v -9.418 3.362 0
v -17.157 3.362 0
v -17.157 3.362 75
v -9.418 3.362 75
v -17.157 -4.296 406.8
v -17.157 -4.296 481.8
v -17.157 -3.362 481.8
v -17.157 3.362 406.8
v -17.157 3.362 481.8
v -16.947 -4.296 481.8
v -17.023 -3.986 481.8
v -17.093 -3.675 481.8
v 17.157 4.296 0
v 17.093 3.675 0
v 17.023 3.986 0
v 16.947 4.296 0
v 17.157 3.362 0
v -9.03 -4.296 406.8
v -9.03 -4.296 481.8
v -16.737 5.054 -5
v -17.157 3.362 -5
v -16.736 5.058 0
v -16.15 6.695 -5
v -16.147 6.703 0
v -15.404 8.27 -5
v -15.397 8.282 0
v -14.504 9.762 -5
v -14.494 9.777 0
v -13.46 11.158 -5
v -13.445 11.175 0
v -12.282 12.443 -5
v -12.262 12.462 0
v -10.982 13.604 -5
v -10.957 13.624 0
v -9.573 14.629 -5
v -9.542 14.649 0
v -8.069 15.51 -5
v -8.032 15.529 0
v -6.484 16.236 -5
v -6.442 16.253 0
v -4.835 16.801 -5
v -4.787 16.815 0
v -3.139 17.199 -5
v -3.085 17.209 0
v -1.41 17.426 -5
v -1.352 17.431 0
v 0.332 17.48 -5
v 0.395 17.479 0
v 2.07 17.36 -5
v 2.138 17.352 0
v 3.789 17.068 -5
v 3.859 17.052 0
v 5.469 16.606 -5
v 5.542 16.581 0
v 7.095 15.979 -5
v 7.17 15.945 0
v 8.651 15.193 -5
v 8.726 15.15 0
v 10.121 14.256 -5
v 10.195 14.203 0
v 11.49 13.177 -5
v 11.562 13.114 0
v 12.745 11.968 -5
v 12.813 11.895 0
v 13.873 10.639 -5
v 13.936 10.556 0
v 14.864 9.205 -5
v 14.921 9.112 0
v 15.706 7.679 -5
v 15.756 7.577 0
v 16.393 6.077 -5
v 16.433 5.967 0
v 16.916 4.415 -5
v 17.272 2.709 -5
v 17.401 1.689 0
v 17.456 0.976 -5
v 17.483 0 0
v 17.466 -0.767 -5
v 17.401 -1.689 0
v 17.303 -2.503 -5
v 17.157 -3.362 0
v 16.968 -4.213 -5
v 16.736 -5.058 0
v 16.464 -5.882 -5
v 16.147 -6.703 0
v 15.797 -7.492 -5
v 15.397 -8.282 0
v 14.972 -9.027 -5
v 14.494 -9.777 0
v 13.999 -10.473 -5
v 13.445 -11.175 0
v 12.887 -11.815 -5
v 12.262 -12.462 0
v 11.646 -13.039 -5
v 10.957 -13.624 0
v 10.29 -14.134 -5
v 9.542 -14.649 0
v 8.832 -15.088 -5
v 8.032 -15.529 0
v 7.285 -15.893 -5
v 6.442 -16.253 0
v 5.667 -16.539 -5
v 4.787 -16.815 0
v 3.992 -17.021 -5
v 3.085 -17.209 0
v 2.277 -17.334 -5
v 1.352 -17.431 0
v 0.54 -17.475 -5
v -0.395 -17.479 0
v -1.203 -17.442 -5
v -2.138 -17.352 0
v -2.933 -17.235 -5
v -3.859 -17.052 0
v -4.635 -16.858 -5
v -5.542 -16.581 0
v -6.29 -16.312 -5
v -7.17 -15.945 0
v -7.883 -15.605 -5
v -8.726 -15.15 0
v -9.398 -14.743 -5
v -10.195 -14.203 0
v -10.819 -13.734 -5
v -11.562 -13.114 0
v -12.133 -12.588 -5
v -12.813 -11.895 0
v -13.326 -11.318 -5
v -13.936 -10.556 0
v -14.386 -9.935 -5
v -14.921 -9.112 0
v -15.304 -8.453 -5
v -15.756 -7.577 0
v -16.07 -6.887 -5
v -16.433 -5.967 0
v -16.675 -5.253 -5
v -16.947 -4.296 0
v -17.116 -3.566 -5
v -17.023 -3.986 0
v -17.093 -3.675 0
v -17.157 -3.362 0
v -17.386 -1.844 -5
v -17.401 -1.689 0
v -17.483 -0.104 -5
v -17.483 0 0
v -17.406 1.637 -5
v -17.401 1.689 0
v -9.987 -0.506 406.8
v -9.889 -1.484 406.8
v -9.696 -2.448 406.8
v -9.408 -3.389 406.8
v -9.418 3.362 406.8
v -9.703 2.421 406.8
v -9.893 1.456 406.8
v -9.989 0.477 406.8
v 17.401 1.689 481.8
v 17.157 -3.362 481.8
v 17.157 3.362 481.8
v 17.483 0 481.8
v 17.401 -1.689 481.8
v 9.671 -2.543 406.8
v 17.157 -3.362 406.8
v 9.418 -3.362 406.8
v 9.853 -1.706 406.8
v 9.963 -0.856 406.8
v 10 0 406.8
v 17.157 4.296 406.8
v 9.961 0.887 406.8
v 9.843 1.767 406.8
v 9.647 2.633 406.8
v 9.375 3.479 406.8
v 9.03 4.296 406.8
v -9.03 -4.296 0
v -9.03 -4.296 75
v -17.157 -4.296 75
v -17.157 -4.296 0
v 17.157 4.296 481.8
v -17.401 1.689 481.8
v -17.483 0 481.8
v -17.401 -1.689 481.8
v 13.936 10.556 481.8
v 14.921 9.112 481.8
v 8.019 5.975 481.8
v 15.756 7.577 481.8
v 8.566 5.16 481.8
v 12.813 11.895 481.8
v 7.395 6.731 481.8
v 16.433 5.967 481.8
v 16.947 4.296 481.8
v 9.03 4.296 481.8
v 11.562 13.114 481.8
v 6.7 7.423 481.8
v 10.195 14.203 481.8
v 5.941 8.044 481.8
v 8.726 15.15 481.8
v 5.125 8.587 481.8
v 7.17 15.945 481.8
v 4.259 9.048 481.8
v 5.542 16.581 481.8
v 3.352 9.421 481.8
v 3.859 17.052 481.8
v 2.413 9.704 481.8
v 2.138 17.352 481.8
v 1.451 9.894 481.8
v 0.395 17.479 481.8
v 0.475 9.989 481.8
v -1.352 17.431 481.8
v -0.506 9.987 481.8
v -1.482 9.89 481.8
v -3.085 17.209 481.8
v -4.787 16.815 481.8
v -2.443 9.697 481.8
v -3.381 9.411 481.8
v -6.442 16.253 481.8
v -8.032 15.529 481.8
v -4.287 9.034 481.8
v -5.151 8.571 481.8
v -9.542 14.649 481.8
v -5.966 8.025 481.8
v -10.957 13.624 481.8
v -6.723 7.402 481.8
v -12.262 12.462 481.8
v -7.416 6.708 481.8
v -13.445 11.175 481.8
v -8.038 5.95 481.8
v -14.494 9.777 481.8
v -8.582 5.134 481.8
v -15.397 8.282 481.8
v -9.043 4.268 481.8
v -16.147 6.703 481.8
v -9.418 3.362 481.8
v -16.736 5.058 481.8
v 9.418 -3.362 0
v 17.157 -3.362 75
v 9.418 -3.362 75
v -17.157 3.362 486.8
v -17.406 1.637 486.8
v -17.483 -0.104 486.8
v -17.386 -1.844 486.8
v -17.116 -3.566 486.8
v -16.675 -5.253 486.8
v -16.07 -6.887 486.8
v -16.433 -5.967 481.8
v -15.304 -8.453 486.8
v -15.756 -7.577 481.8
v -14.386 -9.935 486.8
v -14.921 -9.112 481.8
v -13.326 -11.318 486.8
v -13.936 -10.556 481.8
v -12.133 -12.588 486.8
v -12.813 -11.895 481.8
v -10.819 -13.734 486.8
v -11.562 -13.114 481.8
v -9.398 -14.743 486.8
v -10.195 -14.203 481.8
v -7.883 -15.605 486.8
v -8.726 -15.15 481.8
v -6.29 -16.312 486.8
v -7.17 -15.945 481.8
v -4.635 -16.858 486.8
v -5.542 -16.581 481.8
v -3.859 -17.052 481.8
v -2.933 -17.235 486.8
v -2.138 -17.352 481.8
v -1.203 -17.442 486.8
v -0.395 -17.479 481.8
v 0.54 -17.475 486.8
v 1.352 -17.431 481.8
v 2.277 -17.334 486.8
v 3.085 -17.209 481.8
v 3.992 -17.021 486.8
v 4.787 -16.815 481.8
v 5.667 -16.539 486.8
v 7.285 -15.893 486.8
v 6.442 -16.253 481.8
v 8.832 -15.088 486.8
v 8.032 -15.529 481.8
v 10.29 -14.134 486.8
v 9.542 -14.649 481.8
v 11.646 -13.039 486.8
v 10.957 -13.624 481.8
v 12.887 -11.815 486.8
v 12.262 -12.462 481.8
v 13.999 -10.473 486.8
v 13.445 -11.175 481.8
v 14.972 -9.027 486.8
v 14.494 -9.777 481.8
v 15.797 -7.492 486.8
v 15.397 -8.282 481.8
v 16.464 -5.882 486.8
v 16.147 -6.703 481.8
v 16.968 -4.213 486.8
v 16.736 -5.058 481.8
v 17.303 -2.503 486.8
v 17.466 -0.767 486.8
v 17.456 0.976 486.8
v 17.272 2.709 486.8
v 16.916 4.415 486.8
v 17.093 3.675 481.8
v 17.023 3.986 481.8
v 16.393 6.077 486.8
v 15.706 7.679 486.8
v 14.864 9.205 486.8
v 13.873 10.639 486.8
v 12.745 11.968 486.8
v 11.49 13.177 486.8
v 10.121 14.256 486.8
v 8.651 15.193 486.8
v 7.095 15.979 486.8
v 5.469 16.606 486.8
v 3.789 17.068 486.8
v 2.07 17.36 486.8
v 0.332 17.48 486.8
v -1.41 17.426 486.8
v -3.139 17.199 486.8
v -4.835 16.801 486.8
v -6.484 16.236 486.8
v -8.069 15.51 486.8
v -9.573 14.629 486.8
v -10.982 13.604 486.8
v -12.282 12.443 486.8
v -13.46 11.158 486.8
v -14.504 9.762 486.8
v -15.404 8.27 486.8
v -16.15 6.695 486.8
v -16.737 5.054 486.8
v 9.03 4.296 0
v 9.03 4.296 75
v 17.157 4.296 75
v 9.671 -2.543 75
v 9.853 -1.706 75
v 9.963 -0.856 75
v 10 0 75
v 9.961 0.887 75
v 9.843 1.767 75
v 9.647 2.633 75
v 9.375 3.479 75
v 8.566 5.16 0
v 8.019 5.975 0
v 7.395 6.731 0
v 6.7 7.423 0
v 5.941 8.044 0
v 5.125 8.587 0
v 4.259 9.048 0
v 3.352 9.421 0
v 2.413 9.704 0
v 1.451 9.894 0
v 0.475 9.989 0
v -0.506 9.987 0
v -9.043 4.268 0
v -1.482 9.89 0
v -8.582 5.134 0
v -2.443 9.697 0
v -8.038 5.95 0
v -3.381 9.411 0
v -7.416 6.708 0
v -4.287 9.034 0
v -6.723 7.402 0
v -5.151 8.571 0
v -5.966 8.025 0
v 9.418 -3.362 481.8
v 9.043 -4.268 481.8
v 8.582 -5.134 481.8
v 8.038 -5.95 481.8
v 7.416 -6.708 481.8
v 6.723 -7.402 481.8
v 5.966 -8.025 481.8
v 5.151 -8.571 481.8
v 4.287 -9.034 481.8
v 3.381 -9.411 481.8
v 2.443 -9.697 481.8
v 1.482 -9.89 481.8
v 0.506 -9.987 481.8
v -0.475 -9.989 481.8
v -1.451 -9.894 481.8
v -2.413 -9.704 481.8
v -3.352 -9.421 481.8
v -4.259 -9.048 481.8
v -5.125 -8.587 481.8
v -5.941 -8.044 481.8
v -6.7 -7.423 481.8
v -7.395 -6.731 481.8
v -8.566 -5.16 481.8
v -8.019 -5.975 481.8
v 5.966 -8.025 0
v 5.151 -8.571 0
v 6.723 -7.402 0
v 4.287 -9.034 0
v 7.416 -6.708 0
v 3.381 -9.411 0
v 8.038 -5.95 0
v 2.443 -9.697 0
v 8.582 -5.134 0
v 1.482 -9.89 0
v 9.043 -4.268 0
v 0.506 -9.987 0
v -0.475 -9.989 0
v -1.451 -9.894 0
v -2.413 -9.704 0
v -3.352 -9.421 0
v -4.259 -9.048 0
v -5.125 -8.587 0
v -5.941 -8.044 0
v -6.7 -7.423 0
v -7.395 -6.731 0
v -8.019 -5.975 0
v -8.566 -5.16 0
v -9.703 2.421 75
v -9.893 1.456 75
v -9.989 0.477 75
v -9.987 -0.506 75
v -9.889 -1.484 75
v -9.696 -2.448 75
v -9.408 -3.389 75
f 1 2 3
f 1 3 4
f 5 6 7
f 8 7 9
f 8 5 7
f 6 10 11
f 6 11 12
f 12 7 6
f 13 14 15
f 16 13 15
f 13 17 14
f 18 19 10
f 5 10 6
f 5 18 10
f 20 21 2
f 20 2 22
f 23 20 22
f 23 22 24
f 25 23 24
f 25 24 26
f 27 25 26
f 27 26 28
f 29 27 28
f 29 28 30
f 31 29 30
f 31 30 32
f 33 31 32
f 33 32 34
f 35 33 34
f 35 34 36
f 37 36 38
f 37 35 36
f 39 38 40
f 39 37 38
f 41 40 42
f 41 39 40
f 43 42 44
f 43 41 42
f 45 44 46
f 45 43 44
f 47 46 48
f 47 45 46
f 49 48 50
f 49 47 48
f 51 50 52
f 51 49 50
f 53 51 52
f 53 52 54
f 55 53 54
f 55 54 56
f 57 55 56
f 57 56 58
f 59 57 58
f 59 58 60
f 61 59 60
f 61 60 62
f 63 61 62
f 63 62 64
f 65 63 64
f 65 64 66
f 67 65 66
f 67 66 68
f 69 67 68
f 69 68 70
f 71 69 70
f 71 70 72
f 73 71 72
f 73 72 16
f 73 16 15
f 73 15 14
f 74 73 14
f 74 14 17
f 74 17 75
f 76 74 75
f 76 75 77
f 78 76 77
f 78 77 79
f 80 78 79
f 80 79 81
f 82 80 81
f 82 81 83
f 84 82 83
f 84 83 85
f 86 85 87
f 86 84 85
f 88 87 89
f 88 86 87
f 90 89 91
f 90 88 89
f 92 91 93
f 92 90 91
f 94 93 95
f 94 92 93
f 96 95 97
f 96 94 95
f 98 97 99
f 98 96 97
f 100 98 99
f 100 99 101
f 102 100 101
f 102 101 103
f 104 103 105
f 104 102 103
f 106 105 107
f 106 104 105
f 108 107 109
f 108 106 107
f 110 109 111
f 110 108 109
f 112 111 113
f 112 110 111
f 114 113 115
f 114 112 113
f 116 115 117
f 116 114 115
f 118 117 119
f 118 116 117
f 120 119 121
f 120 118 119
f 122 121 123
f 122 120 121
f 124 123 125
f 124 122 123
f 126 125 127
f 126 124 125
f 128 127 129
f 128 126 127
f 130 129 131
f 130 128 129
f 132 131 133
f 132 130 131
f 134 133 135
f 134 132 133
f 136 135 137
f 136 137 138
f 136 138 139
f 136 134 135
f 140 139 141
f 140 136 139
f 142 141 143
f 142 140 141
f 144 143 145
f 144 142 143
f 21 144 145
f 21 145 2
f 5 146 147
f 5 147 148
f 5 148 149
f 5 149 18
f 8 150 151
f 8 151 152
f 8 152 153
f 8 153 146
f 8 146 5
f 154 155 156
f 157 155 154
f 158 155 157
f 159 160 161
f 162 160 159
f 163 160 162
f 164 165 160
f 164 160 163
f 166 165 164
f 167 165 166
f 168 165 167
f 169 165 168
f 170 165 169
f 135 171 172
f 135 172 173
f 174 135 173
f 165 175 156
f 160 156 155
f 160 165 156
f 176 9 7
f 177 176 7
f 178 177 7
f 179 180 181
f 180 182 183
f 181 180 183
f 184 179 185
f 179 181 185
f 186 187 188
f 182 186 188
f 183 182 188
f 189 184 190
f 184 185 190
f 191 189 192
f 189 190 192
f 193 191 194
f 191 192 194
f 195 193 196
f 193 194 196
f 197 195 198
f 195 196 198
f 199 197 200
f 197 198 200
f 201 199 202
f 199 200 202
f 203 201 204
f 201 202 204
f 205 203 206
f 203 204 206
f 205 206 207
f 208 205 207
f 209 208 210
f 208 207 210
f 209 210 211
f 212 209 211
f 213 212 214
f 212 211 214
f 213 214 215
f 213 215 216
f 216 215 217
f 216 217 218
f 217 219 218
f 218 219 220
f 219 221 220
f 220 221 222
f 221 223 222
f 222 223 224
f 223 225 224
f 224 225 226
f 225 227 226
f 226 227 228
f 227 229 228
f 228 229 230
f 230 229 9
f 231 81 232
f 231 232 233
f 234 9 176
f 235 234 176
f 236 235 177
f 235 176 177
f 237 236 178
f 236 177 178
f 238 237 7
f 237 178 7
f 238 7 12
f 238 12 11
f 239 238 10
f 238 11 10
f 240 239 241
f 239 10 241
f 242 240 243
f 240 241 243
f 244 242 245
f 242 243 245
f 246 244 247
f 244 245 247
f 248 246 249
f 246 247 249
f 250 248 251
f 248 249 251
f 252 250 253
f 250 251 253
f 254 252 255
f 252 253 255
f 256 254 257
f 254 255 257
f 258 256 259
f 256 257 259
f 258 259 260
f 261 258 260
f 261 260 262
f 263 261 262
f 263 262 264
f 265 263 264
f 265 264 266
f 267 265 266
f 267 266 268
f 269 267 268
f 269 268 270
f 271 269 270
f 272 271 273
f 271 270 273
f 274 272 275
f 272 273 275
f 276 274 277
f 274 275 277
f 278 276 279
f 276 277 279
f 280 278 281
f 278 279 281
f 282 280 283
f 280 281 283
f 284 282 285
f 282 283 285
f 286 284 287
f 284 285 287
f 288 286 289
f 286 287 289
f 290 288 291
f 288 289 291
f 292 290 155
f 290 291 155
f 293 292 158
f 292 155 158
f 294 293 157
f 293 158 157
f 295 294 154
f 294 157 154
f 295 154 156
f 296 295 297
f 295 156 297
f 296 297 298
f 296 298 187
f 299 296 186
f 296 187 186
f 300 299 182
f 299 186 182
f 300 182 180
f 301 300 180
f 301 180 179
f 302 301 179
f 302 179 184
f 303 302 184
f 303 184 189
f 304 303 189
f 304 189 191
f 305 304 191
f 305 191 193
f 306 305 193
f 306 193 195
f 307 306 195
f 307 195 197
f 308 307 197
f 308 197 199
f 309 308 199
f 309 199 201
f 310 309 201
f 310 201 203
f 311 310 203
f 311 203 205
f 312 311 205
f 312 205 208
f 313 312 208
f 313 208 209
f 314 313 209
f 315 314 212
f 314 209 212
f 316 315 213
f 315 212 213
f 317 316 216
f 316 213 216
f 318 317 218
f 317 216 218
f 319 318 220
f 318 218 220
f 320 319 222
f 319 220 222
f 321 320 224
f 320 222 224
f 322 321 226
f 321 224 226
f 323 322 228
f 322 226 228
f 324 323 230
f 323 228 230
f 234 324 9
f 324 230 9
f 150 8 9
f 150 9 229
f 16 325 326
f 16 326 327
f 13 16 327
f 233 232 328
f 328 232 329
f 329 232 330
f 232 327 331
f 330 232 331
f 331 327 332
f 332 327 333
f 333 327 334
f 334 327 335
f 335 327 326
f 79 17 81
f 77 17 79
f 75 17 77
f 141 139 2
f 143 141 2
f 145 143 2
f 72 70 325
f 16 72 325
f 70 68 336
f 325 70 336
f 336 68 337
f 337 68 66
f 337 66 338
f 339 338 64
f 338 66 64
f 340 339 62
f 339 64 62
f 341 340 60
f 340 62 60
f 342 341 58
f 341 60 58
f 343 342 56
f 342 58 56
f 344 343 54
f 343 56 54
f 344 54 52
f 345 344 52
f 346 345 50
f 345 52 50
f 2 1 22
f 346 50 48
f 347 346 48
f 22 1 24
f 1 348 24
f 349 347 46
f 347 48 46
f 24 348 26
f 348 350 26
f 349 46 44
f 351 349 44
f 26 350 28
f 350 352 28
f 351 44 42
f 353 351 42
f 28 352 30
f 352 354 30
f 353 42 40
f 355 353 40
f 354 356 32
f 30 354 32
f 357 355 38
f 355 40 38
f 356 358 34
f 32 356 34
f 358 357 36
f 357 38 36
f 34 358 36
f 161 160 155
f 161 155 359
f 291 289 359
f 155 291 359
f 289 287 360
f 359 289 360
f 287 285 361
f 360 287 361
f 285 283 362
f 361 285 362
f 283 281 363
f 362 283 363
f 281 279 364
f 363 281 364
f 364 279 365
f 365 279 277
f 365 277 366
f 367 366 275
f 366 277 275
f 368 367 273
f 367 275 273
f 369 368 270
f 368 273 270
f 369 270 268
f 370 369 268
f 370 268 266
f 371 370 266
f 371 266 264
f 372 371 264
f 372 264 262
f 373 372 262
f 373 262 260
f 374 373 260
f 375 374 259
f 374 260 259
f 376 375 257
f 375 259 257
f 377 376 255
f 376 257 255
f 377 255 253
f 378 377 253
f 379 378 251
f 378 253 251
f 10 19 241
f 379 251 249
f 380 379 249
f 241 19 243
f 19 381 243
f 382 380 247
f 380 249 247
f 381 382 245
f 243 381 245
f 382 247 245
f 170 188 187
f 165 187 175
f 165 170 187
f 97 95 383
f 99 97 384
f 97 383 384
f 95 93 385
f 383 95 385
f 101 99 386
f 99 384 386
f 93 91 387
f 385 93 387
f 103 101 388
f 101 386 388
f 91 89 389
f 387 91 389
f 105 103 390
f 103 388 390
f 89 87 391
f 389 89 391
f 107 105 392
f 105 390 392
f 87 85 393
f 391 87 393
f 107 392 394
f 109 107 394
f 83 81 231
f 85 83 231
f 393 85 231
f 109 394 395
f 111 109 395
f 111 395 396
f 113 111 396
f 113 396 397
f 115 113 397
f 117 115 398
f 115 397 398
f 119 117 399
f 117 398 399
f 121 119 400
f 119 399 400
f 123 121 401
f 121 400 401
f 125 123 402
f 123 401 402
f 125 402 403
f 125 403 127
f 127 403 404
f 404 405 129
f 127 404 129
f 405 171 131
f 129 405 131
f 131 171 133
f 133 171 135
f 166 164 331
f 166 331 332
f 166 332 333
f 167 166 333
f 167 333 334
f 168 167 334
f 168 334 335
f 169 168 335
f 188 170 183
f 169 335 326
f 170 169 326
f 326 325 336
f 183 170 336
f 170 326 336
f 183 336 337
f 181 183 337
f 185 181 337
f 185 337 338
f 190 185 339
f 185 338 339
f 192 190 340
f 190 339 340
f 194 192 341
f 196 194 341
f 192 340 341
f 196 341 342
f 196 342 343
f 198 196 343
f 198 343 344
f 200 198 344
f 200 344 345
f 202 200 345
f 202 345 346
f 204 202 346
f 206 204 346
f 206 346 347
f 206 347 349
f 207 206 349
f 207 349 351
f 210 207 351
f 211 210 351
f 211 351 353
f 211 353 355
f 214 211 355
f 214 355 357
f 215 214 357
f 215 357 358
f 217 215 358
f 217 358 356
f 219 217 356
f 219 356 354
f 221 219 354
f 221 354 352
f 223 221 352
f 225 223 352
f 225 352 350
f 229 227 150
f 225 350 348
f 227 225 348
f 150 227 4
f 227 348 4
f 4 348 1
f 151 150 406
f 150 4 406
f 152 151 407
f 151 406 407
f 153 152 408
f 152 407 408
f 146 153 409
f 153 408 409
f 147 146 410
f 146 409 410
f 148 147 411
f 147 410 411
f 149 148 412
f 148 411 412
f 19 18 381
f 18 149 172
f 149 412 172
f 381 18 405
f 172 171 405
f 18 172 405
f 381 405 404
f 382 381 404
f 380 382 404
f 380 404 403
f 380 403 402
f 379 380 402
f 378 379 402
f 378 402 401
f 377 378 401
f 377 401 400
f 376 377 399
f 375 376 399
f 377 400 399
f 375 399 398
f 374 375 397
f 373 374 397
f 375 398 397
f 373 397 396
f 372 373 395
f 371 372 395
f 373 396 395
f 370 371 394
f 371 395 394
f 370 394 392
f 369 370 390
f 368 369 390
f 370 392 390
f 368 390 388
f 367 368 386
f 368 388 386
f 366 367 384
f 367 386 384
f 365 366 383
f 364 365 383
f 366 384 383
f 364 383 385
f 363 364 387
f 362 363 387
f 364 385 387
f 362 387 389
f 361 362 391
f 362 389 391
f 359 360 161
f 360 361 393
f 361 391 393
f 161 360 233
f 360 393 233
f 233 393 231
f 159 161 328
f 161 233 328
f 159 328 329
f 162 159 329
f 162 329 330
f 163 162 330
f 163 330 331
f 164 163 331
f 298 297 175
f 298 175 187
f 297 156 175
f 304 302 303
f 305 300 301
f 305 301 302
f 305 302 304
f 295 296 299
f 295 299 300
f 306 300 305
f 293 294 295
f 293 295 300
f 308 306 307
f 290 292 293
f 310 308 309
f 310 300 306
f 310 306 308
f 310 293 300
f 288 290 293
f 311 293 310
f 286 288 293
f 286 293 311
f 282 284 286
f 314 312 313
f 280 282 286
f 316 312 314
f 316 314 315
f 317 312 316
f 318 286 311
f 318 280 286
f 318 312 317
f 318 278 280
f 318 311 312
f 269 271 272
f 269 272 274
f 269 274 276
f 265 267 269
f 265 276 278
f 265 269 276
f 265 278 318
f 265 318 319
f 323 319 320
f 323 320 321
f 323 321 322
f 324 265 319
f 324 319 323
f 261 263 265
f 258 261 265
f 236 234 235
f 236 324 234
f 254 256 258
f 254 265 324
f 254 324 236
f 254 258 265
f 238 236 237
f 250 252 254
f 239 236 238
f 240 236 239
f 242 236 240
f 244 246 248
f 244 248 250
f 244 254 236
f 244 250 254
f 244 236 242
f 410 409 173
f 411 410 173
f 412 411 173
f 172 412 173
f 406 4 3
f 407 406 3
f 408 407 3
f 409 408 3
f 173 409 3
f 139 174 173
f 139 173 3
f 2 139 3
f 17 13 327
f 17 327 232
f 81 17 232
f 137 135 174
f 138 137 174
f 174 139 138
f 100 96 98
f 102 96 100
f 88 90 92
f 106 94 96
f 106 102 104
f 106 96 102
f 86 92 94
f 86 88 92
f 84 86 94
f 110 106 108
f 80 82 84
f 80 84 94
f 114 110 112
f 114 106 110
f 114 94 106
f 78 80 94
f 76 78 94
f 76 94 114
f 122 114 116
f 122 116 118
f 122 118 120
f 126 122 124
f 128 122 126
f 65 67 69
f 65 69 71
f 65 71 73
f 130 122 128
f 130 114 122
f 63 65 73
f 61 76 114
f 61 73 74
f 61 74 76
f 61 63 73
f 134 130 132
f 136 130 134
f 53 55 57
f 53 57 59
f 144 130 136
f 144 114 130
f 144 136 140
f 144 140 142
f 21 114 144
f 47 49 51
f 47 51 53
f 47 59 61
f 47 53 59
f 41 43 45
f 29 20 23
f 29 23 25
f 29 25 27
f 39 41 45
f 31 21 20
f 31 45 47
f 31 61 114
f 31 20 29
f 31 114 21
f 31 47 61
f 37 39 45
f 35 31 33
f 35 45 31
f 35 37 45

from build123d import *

# Parameters (mm, degrees)
SKETCH1_R           = 10
BOSS_EXTRUDE2_DEPTH = 481.8
BOSS_EXTRUDE4_DEPTH = 75
BOSS_EXTRUDE5_START = -75
BOSS_EXTRUDE5_DEPTH = 75
SKETCH7_R           = 17.483123284
BOSS_EXTRUDE6_DEPTH = 5
BOSS_EXTRUDE7_START = 5
SKETCH8_R           = 17.483123284
BOSS_EXTRUDE7_DEPTH = 5


with BuildPart() as part:
    # Sketch1 → Boss-Extrude2 (new body)
    with BuildSketch(Plane.XY):
        Circle(SKETCH1_R)
    extrude(amount=BOSS_EXTRUDE2_DEPTH)

    # Sketch2 → Boss-Extrude4 (add)
    with BuildSketch(Plane.XY):
        with BuildLine():
            Line((9.029963331, 4.296482543), (17.156826423, 4.296482543))
            Line((17.156826423, 4.296482543), (17.156826423, -3.361979608))
            Line((17.156826423, -3.361979608), (9.417913416, -3.361979608))
            ThreePointArc((9.417913416, -3.361979608), (9.987194288, 0.50591526), (9.029963331, 4.296482543))
        make_face()
        with BuildLine():
            Line((-9.029963331, -4.296482543), (-17.156826423, -4.296482543))
            Line((-17.156826423, -4.296482543), (-17.156826423, 3.361979608))
            Line((-17.156826423, 3.361979608), (-9.417913416, 3.361979608))
            ThreePointArc((-9.417913416, 3.361979608), (-9.987194288, -0.50591526), (-9.029963331, -4.296482543))
        make_face()
    extrude(amount=BOSS_EXTRUDE4_DEPTH)

    # Sketch4 → Boss-Extrude5 (add)
    with BuildSketch(Plane.XY.offset(481.8).offset(BOSS_EXTRUDE5_START)):
        with BuildLine():
            Line((9.029963331, 4.296482543), (17.156826423, 4.296482543))
            Line((17.156826423, 4.296482543), (17.156826423, -3.361979608))
            Line((17.156826423, -3.361979608), (9.417913416, -3.361979608))
            ThreePointArc((9.417913416, -3.361979608), (9.987194288, 0.50591526), (9.029963331, 4.296482543))
        make_face()
        with BuildLine():
            Line((-9.029963331, -4.296482543), (-17.156826423, -4.296482543))
            Line((-17.156826423, -4.296482543), (-17.156826423, 3.361979608))
            Line((-17.156826423, 3.361979608), (-9.417913416, 3.361979608))
            ThreePointArc((-9.417913416, 3.361979608), (-9.987194288, -0.50591526), (-9.029963331, -4.296482543))
        make_face()
    extrude(amount=BOSS_EXTRUDE5_DEPTH)

    # Sketch7 → Boss-Extrude6 (add)
    with BuildSketch(Plane.XY.offset(481.8)):
        with Locations(Location((0, 0, 0), (0, 0, 168.913043394))):
            Circle(SKETCH7_R)
    extrude(amount=BOSS_EXTRUDE6_DEPTH)

    # Sketch8 → Boss-Extrude7 (add)
    with BuildSketch(Plane(origin=(0, 0, 0), x_dir=(-1, 0, 0), z_dir=(0, 0, -1)).offset(BOSS_EXTRUDE7_START)):
        with Locations(Location((0, 0, 0), (0, 0, 11.086956606))):
            Circle(SKETCH8_R)
    extrude(amount=-BOSS_EXTRUDE7_DEPTH)


solid = part.part
